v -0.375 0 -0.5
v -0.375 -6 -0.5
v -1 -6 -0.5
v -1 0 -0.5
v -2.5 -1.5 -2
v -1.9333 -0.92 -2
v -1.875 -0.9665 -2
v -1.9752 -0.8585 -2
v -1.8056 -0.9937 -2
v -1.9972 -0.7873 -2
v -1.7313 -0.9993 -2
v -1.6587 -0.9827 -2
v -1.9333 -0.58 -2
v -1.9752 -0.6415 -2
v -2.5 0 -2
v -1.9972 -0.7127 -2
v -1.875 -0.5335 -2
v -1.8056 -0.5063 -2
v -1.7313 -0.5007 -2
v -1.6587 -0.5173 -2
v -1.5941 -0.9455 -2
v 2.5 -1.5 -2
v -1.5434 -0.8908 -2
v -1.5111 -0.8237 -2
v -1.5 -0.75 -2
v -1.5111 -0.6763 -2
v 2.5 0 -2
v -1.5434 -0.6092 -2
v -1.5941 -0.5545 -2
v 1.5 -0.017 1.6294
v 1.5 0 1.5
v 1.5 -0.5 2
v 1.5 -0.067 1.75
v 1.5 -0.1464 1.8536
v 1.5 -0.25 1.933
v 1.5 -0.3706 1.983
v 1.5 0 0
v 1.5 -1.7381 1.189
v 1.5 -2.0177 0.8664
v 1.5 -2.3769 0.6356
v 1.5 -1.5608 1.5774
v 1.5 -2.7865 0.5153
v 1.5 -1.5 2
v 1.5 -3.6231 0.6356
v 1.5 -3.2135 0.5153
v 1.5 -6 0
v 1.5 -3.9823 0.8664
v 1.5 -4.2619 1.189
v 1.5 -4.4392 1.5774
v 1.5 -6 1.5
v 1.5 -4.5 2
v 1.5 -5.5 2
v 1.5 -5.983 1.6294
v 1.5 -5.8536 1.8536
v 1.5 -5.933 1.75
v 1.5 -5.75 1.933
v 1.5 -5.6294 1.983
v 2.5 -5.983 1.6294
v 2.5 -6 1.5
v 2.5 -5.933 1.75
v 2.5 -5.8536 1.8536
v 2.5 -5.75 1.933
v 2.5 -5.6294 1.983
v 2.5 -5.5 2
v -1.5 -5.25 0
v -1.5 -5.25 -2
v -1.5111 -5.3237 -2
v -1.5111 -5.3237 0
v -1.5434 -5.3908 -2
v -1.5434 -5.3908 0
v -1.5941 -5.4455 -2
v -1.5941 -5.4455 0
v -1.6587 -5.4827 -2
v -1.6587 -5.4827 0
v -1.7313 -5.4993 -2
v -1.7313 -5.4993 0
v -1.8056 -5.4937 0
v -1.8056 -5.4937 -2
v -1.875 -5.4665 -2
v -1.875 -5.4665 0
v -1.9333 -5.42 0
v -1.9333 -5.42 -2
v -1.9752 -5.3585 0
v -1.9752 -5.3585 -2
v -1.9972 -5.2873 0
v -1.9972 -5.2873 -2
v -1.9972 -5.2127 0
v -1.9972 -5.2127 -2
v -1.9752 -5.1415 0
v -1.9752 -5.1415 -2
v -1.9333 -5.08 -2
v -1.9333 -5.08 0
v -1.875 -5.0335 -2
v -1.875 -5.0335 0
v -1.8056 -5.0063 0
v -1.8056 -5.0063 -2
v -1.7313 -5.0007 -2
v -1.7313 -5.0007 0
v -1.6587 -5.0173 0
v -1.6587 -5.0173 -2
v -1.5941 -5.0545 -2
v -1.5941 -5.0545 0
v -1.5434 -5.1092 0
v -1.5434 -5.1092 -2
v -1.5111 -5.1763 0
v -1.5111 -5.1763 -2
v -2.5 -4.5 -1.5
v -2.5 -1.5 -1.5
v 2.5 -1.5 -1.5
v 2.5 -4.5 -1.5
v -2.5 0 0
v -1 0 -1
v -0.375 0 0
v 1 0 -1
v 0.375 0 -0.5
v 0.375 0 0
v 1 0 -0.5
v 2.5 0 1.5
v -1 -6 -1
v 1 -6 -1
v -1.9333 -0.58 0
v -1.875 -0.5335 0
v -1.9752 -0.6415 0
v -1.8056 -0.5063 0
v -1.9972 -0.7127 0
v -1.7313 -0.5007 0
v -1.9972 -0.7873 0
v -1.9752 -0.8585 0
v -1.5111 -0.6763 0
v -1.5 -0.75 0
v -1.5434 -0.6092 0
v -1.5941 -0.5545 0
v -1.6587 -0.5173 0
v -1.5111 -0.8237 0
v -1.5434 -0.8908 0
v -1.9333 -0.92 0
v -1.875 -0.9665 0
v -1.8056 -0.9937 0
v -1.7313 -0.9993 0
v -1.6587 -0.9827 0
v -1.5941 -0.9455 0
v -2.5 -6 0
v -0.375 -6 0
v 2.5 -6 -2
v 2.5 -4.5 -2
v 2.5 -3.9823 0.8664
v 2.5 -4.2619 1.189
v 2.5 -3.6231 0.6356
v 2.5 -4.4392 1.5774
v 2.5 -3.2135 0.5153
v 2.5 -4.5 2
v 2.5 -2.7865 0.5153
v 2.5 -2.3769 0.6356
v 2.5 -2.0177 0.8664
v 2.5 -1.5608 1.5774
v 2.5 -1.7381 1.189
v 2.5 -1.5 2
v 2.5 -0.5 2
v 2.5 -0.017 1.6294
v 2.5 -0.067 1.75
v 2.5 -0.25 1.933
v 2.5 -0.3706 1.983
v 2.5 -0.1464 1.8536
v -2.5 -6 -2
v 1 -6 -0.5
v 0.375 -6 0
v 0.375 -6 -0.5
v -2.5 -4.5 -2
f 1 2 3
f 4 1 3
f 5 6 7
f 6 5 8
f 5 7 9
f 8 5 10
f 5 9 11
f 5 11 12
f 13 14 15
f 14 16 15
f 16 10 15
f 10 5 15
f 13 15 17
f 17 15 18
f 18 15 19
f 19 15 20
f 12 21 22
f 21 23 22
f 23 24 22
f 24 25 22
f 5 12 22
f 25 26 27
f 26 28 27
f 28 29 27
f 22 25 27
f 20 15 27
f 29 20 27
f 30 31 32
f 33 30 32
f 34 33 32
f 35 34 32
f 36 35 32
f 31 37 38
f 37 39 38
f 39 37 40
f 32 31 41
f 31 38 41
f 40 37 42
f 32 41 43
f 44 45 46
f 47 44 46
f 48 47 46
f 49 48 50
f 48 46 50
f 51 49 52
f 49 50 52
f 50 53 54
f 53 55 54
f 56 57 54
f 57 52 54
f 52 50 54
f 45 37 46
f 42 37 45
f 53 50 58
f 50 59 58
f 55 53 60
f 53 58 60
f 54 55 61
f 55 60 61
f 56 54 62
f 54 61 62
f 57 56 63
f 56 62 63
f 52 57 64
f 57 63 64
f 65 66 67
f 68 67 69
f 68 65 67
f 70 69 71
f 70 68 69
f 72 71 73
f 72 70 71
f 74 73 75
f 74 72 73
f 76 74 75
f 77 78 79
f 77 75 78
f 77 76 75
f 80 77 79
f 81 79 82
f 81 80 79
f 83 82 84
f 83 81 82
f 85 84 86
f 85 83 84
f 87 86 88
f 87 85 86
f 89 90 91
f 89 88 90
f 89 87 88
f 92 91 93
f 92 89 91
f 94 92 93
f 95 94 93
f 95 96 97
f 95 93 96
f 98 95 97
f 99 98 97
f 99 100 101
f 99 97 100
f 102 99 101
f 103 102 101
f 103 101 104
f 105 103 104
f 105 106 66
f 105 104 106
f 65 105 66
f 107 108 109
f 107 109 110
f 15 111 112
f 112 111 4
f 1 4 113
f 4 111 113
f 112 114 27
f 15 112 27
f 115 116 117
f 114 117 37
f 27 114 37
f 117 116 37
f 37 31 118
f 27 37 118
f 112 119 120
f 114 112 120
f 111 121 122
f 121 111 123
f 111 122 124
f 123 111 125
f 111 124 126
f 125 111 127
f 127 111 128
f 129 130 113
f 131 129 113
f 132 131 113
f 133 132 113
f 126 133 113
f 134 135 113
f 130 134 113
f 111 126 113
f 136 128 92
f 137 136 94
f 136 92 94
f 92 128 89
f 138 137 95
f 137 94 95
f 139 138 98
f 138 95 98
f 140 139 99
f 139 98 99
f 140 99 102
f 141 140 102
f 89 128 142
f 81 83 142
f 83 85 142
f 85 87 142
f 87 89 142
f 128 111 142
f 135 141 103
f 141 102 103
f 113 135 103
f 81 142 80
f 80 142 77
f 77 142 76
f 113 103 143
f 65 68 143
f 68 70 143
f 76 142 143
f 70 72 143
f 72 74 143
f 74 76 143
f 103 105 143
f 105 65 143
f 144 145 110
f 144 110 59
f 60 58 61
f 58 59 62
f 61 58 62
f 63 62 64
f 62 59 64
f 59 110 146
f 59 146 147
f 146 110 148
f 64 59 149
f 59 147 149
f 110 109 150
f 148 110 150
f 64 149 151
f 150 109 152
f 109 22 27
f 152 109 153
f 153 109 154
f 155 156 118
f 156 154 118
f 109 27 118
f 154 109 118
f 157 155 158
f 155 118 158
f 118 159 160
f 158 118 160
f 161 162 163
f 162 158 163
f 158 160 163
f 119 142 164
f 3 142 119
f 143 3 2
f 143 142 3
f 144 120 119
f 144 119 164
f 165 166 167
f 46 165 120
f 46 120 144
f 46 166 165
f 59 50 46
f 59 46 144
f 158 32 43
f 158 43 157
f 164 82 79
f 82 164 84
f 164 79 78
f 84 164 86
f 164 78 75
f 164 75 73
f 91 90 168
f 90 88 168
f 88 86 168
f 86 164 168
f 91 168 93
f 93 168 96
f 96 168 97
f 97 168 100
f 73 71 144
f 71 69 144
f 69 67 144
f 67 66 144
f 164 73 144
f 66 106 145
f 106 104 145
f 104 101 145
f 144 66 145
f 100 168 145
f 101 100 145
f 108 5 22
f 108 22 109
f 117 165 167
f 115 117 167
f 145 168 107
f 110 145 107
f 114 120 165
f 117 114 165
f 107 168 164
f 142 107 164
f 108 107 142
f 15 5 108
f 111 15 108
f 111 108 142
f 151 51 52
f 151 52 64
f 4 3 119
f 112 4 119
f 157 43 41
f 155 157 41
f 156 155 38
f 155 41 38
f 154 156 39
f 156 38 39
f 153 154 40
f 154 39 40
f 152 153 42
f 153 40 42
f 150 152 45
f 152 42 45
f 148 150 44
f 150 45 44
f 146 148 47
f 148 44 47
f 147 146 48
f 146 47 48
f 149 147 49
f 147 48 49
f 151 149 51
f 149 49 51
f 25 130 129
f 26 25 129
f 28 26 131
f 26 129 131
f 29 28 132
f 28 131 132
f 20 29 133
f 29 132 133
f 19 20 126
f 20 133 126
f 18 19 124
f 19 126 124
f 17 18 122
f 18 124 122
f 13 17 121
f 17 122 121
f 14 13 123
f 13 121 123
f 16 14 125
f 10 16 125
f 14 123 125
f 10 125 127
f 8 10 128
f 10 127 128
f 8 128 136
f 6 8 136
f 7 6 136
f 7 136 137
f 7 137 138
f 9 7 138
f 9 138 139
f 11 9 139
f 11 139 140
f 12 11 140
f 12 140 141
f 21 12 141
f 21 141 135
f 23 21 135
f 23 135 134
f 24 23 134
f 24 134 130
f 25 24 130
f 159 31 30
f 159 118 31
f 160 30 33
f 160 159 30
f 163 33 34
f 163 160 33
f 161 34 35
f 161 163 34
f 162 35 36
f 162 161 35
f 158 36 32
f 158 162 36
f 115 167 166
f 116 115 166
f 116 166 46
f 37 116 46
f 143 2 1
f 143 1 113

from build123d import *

# Parameters (mm, degrees)
F0_W      = 5
F0_H      = 4
F1_DEPTH  = 6
F2_W      = 4
F2_H      = 2
F3_DEPTH  = 6.001
F4_W      = 0.75
F4_H      = 0.5
F5_DEPTH  = 6.001
F6_W      = 3
F6_H      = 0.5
F7_DEPTH  = 5.001
F8_R      = 1.5
F9_DEPTH  = 1.001
F10_R     = 0.5
F11_R     = 0.25
F12_DEPTH = 2.001


# Not quite as in the source:
# - a pattern or mirror of a feature is missing from the dataset's text; its kind, count and spacing are read off the source's solid


with BuildPart() as f1:
    # F0 (on Front) → F1 (new body)
    with BuildSketch(Plane.XZ):
        Rectangle(F0_W, F0_H)
    extrude(amount=F1_DEPTH)

    # F2 (on face) → F3 (cut, through all)
    with BuildSketch(Plane.XZ.offset(6)):
        with Locations((-0.5, 1)):
            Rectangle(F2_W, F2_H)
    extrude(amount=-F3_DEPTH, mode=Mode.SUBTRACT)

    # F4 (on face) → F5 (cut, through all)
    with BuildSketch(Plane.XZ.offset(6)):
        with Locations((0, -0.25)):
            Rectangle(F4_W, F4_H)
        Polygon((1, -0.5), (0.375, -0.5), (-0.375, -0.5), (-1, -0.5), (-1, -1), (1, -1), align=None)
    extrude(amount=-F5_DEPTH, mode=Mode.SUBTRACT)

    # F6 (on face) → F7 (cut, through all)
    with BuildSketch(Plane(origin=(-2.5, 0, 0), x_dir=(0, -1, 0), z_dir=(-1, 0, 0))):
        with Locations((3, -1.75)):
            Rectangle(F6_W, F6_H)
    extrude(amount=-F7_DEPTH, mode=Mode.SUBTRACT)

    # F8 (on face) → F9 (cut, through all)
    with BuildSketch(Plane(origin=(1.5, 0, 0), x_dir=(0, -1, 0), z_dir=(-1, 0, 0))):
        with Locations((3, 2)):
            Circle(F8_R)
    extrude(amount=-F9_DEPTH, mode=Mode.SUBTRACT)

    # F10
    f10_edges = [f1.edges().sort_by_distance(p)[0] for p in [
        (2, -6, 2),
        (2, 0, 2),
    ]]
    fillet(f10_edges, radius=F10_R)

    # F11 (on face) → F12 (cut, through all)
    with BuildSketch(Plane.XY):
        with Locations((-1.75, -0.75)):
            Circle(F11_R)
    f12 = extrude(amount=-F12_DEPTH, mode=Mode.SUBTRACT)

    # F12_copies: F12 across plane
    add(f12.mirror(Plane(origin=(0, -3, 0), x_dir=(0, 0, -1), z_dir=(0, -1, 0))), mode=Mode.SUBTRACT)


solid = f1.part
